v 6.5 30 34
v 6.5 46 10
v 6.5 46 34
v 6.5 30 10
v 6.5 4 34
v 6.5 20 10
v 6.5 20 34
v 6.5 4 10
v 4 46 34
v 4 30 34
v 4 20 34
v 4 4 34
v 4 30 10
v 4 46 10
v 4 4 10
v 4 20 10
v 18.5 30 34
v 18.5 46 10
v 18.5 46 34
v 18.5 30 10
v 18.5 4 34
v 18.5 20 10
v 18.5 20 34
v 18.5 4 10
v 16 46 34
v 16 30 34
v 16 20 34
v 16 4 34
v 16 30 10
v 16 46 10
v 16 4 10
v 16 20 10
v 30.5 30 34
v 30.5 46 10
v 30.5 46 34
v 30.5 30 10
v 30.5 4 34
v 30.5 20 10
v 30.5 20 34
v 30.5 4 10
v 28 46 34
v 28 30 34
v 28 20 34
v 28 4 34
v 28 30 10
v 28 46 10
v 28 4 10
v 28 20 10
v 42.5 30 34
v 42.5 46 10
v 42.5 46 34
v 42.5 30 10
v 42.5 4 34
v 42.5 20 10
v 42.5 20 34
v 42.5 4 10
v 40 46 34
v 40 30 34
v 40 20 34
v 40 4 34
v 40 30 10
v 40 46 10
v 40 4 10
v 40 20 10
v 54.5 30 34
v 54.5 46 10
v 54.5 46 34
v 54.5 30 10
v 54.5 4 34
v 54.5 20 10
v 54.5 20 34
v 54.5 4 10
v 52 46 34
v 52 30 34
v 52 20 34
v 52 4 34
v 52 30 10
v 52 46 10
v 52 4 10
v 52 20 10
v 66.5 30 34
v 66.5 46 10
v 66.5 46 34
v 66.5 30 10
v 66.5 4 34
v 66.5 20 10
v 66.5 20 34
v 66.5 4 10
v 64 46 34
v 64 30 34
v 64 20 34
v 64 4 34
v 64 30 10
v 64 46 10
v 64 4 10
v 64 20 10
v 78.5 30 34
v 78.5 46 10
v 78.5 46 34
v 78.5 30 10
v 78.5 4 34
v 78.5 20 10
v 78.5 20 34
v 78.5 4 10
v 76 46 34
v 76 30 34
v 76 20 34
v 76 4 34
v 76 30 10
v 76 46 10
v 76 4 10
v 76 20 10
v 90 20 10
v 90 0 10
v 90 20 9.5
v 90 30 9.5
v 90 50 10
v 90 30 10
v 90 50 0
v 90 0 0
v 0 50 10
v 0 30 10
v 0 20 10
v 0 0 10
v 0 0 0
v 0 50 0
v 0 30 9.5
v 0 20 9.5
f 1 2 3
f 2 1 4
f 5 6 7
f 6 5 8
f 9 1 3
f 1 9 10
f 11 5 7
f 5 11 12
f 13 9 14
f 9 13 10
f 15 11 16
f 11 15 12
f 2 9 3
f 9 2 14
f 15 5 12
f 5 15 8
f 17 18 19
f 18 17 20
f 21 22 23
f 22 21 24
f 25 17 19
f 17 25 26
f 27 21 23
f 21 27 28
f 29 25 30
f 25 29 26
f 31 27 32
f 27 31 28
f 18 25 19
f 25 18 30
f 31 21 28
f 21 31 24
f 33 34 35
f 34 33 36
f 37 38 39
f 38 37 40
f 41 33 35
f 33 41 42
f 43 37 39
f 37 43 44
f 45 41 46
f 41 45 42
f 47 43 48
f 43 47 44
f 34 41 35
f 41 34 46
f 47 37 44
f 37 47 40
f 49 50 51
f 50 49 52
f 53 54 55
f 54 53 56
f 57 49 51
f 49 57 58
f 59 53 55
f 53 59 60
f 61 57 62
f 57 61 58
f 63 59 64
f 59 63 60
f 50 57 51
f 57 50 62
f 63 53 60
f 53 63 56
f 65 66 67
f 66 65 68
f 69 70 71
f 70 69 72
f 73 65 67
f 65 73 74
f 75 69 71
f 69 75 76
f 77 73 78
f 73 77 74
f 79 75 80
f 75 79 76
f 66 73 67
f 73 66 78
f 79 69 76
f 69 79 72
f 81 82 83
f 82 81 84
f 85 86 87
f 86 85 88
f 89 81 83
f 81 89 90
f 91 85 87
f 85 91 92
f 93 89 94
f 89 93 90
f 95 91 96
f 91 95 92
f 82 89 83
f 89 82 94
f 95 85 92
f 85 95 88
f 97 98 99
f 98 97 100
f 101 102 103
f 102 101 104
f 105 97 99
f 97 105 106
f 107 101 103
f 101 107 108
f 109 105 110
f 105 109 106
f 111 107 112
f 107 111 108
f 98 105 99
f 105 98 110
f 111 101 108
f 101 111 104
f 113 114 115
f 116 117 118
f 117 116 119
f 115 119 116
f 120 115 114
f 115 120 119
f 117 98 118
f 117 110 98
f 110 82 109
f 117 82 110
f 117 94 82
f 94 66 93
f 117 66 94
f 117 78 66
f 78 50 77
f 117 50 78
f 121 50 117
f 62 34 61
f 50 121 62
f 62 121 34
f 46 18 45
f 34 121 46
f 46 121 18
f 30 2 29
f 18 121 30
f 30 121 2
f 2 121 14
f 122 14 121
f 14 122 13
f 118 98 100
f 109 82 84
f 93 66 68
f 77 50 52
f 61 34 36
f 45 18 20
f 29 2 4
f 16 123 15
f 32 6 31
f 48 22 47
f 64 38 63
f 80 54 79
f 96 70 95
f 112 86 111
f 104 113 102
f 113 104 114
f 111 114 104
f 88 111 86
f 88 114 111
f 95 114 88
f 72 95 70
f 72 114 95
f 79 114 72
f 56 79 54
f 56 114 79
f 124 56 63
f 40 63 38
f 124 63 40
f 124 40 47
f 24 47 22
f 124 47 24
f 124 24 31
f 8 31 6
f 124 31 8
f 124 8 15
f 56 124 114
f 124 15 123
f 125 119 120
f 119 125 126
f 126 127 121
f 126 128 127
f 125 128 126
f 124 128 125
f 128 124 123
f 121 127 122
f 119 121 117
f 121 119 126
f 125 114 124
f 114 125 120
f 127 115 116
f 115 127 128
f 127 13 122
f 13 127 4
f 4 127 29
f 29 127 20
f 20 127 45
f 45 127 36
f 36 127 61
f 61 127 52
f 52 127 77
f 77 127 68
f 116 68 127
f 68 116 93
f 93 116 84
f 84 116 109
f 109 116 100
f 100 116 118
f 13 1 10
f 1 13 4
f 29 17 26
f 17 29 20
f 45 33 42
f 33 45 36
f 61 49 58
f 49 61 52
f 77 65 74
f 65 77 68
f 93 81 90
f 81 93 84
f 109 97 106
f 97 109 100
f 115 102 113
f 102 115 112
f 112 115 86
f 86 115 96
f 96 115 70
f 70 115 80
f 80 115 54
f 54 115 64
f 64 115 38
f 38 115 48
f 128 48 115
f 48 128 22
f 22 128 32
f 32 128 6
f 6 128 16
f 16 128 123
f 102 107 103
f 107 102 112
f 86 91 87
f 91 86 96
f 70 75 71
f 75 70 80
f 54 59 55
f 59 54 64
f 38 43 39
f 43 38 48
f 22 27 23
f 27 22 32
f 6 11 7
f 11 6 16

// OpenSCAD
$fn = 32;

// ----------------------------------------------------------------------
// Heatsink: slotted fin block
// ----------------------------------------------------------------------

// --- parameters (mm) ---
base_l = 90;              // base length, X
base_w = 50;              // base width, Y
base_t = 10;              // base plate thickness
fin_h = 25;               // fin height above the base
fin_t = 2.5;              // fin thickness
edge = 4;                 // margin from the base ends
pitch = 12;               // fin pitch
slot_w = 10;              // central slot width, Y

n_fins = floor((base_l - 2 * edge - fin_t) / pitch) + 1;  // fin count
total_h = base_t + fin_h - 1;  // overall height

difference() {
union() {
  cube([base_l, base_w, base_t]);
  for (i = [0 : n_fins - 1])
    translate([edge + i * pitch, edge, base_t - 1])
      cube([fin_t, base_w - 2 * edge, fin_h]);
}
  translate([-1, base_w / 2 - slot_w / 2, base_t - 0.5])
    cube([base_l + 2, slot_w, fin_h + 2]);
}
